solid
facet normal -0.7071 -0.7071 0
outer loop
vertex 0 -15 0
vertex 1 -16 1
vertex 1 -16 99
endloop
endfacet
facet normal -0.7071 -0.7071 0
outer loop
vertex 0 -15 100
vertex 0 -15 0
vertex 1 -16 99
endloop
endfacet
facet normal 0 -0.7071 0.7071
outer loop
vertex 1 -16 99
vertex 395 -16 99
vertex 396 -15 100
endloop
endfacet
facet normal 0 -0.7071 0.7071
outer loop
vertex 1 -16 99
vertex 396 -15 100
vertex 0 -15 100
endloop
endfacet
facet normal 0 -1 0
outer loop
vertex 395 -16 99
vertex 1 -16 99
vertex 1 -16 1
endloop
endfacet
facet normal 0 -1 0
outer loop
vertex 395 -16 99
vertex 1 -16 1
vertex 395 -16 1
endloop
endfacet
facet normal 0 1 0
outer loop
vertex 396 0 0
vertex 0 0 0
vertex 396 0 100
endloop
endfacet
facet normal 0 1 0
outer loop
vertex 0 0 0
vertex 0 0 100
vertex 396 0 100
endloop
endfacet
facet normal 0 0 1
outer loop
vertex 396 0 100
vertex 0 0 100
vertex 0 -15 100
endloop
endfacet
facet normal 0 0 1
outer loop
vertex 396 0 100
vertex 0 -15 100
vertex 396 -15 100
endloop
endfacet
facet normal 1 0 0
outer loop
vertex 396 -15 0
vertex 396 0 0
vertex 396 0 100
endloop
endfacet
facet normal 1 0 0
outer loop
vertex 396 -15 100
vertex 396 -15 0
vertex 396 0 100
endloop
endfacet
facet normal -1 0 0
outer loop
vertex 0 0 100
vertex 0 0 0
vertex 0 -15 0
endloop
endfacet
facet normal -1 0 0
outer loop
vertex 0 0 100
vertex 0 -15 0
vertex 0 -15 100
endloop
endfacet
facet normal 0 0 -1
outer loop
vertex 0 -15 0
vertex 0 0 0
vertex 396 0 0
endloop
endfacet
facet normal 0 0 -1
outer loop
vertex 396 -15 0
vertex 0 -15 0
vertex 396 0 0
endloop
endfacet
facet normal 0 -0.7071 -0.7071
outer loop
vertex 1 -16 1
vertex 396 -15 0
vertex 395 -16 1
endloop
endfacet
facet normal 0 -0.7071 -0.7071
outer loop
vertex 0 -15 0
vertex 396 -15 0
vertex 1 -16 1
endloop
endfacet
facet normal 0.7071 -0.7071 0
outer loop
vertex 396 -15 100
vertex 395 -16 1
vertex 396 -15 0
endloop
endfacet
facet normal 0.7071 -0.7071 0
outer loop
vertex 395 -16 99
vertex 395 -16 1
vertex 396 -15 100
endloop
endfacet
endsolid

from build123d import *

# Parameters (mm, degrees)
F0_W     = 43.5700342059
F0_H     = 38.6628769338
F1_DEPTH = 16
F2_DEPTH = 396
F3_DEPTH = 100
F4_SIZE  = 1


with BuildPart() as f1:
    # F0 (on Front) → F1 (new body)
    with BuildSketch(Plane.XZ):
        with Locations((21.785017103, 19.3314384669)):
            Rectangle(F0_W, F0_H)
    extrude(amount=F1_DEPTH)

    # F2 (add): a face of the model
    f2_faces = [f1.faces().sort_by_distance(p)[0] for p in [
        (0, -8, 19.3314384669),
    ]]
    extrude(f2_faces, amount=-F2_DEPTH)

    # F3 (add): a face of the model
    f3_faces = [f1.faces().sort_by_distance(p)[0] for p in [
        (198, -8, 0),
    ]]
    extrude(f3_faces, amount=-F3_DEPTH)

    # F4
    f4_edges = [f1.edges().sort_by_distance(p)[0] for p in [
        (0, -16, 50),
        (198, -16, 0),
        (396, -16, 50),
        (198, -16, 100),
    ]]
    chamfer(f4_edges, length=F4_SIZE)


solid = f1.part
